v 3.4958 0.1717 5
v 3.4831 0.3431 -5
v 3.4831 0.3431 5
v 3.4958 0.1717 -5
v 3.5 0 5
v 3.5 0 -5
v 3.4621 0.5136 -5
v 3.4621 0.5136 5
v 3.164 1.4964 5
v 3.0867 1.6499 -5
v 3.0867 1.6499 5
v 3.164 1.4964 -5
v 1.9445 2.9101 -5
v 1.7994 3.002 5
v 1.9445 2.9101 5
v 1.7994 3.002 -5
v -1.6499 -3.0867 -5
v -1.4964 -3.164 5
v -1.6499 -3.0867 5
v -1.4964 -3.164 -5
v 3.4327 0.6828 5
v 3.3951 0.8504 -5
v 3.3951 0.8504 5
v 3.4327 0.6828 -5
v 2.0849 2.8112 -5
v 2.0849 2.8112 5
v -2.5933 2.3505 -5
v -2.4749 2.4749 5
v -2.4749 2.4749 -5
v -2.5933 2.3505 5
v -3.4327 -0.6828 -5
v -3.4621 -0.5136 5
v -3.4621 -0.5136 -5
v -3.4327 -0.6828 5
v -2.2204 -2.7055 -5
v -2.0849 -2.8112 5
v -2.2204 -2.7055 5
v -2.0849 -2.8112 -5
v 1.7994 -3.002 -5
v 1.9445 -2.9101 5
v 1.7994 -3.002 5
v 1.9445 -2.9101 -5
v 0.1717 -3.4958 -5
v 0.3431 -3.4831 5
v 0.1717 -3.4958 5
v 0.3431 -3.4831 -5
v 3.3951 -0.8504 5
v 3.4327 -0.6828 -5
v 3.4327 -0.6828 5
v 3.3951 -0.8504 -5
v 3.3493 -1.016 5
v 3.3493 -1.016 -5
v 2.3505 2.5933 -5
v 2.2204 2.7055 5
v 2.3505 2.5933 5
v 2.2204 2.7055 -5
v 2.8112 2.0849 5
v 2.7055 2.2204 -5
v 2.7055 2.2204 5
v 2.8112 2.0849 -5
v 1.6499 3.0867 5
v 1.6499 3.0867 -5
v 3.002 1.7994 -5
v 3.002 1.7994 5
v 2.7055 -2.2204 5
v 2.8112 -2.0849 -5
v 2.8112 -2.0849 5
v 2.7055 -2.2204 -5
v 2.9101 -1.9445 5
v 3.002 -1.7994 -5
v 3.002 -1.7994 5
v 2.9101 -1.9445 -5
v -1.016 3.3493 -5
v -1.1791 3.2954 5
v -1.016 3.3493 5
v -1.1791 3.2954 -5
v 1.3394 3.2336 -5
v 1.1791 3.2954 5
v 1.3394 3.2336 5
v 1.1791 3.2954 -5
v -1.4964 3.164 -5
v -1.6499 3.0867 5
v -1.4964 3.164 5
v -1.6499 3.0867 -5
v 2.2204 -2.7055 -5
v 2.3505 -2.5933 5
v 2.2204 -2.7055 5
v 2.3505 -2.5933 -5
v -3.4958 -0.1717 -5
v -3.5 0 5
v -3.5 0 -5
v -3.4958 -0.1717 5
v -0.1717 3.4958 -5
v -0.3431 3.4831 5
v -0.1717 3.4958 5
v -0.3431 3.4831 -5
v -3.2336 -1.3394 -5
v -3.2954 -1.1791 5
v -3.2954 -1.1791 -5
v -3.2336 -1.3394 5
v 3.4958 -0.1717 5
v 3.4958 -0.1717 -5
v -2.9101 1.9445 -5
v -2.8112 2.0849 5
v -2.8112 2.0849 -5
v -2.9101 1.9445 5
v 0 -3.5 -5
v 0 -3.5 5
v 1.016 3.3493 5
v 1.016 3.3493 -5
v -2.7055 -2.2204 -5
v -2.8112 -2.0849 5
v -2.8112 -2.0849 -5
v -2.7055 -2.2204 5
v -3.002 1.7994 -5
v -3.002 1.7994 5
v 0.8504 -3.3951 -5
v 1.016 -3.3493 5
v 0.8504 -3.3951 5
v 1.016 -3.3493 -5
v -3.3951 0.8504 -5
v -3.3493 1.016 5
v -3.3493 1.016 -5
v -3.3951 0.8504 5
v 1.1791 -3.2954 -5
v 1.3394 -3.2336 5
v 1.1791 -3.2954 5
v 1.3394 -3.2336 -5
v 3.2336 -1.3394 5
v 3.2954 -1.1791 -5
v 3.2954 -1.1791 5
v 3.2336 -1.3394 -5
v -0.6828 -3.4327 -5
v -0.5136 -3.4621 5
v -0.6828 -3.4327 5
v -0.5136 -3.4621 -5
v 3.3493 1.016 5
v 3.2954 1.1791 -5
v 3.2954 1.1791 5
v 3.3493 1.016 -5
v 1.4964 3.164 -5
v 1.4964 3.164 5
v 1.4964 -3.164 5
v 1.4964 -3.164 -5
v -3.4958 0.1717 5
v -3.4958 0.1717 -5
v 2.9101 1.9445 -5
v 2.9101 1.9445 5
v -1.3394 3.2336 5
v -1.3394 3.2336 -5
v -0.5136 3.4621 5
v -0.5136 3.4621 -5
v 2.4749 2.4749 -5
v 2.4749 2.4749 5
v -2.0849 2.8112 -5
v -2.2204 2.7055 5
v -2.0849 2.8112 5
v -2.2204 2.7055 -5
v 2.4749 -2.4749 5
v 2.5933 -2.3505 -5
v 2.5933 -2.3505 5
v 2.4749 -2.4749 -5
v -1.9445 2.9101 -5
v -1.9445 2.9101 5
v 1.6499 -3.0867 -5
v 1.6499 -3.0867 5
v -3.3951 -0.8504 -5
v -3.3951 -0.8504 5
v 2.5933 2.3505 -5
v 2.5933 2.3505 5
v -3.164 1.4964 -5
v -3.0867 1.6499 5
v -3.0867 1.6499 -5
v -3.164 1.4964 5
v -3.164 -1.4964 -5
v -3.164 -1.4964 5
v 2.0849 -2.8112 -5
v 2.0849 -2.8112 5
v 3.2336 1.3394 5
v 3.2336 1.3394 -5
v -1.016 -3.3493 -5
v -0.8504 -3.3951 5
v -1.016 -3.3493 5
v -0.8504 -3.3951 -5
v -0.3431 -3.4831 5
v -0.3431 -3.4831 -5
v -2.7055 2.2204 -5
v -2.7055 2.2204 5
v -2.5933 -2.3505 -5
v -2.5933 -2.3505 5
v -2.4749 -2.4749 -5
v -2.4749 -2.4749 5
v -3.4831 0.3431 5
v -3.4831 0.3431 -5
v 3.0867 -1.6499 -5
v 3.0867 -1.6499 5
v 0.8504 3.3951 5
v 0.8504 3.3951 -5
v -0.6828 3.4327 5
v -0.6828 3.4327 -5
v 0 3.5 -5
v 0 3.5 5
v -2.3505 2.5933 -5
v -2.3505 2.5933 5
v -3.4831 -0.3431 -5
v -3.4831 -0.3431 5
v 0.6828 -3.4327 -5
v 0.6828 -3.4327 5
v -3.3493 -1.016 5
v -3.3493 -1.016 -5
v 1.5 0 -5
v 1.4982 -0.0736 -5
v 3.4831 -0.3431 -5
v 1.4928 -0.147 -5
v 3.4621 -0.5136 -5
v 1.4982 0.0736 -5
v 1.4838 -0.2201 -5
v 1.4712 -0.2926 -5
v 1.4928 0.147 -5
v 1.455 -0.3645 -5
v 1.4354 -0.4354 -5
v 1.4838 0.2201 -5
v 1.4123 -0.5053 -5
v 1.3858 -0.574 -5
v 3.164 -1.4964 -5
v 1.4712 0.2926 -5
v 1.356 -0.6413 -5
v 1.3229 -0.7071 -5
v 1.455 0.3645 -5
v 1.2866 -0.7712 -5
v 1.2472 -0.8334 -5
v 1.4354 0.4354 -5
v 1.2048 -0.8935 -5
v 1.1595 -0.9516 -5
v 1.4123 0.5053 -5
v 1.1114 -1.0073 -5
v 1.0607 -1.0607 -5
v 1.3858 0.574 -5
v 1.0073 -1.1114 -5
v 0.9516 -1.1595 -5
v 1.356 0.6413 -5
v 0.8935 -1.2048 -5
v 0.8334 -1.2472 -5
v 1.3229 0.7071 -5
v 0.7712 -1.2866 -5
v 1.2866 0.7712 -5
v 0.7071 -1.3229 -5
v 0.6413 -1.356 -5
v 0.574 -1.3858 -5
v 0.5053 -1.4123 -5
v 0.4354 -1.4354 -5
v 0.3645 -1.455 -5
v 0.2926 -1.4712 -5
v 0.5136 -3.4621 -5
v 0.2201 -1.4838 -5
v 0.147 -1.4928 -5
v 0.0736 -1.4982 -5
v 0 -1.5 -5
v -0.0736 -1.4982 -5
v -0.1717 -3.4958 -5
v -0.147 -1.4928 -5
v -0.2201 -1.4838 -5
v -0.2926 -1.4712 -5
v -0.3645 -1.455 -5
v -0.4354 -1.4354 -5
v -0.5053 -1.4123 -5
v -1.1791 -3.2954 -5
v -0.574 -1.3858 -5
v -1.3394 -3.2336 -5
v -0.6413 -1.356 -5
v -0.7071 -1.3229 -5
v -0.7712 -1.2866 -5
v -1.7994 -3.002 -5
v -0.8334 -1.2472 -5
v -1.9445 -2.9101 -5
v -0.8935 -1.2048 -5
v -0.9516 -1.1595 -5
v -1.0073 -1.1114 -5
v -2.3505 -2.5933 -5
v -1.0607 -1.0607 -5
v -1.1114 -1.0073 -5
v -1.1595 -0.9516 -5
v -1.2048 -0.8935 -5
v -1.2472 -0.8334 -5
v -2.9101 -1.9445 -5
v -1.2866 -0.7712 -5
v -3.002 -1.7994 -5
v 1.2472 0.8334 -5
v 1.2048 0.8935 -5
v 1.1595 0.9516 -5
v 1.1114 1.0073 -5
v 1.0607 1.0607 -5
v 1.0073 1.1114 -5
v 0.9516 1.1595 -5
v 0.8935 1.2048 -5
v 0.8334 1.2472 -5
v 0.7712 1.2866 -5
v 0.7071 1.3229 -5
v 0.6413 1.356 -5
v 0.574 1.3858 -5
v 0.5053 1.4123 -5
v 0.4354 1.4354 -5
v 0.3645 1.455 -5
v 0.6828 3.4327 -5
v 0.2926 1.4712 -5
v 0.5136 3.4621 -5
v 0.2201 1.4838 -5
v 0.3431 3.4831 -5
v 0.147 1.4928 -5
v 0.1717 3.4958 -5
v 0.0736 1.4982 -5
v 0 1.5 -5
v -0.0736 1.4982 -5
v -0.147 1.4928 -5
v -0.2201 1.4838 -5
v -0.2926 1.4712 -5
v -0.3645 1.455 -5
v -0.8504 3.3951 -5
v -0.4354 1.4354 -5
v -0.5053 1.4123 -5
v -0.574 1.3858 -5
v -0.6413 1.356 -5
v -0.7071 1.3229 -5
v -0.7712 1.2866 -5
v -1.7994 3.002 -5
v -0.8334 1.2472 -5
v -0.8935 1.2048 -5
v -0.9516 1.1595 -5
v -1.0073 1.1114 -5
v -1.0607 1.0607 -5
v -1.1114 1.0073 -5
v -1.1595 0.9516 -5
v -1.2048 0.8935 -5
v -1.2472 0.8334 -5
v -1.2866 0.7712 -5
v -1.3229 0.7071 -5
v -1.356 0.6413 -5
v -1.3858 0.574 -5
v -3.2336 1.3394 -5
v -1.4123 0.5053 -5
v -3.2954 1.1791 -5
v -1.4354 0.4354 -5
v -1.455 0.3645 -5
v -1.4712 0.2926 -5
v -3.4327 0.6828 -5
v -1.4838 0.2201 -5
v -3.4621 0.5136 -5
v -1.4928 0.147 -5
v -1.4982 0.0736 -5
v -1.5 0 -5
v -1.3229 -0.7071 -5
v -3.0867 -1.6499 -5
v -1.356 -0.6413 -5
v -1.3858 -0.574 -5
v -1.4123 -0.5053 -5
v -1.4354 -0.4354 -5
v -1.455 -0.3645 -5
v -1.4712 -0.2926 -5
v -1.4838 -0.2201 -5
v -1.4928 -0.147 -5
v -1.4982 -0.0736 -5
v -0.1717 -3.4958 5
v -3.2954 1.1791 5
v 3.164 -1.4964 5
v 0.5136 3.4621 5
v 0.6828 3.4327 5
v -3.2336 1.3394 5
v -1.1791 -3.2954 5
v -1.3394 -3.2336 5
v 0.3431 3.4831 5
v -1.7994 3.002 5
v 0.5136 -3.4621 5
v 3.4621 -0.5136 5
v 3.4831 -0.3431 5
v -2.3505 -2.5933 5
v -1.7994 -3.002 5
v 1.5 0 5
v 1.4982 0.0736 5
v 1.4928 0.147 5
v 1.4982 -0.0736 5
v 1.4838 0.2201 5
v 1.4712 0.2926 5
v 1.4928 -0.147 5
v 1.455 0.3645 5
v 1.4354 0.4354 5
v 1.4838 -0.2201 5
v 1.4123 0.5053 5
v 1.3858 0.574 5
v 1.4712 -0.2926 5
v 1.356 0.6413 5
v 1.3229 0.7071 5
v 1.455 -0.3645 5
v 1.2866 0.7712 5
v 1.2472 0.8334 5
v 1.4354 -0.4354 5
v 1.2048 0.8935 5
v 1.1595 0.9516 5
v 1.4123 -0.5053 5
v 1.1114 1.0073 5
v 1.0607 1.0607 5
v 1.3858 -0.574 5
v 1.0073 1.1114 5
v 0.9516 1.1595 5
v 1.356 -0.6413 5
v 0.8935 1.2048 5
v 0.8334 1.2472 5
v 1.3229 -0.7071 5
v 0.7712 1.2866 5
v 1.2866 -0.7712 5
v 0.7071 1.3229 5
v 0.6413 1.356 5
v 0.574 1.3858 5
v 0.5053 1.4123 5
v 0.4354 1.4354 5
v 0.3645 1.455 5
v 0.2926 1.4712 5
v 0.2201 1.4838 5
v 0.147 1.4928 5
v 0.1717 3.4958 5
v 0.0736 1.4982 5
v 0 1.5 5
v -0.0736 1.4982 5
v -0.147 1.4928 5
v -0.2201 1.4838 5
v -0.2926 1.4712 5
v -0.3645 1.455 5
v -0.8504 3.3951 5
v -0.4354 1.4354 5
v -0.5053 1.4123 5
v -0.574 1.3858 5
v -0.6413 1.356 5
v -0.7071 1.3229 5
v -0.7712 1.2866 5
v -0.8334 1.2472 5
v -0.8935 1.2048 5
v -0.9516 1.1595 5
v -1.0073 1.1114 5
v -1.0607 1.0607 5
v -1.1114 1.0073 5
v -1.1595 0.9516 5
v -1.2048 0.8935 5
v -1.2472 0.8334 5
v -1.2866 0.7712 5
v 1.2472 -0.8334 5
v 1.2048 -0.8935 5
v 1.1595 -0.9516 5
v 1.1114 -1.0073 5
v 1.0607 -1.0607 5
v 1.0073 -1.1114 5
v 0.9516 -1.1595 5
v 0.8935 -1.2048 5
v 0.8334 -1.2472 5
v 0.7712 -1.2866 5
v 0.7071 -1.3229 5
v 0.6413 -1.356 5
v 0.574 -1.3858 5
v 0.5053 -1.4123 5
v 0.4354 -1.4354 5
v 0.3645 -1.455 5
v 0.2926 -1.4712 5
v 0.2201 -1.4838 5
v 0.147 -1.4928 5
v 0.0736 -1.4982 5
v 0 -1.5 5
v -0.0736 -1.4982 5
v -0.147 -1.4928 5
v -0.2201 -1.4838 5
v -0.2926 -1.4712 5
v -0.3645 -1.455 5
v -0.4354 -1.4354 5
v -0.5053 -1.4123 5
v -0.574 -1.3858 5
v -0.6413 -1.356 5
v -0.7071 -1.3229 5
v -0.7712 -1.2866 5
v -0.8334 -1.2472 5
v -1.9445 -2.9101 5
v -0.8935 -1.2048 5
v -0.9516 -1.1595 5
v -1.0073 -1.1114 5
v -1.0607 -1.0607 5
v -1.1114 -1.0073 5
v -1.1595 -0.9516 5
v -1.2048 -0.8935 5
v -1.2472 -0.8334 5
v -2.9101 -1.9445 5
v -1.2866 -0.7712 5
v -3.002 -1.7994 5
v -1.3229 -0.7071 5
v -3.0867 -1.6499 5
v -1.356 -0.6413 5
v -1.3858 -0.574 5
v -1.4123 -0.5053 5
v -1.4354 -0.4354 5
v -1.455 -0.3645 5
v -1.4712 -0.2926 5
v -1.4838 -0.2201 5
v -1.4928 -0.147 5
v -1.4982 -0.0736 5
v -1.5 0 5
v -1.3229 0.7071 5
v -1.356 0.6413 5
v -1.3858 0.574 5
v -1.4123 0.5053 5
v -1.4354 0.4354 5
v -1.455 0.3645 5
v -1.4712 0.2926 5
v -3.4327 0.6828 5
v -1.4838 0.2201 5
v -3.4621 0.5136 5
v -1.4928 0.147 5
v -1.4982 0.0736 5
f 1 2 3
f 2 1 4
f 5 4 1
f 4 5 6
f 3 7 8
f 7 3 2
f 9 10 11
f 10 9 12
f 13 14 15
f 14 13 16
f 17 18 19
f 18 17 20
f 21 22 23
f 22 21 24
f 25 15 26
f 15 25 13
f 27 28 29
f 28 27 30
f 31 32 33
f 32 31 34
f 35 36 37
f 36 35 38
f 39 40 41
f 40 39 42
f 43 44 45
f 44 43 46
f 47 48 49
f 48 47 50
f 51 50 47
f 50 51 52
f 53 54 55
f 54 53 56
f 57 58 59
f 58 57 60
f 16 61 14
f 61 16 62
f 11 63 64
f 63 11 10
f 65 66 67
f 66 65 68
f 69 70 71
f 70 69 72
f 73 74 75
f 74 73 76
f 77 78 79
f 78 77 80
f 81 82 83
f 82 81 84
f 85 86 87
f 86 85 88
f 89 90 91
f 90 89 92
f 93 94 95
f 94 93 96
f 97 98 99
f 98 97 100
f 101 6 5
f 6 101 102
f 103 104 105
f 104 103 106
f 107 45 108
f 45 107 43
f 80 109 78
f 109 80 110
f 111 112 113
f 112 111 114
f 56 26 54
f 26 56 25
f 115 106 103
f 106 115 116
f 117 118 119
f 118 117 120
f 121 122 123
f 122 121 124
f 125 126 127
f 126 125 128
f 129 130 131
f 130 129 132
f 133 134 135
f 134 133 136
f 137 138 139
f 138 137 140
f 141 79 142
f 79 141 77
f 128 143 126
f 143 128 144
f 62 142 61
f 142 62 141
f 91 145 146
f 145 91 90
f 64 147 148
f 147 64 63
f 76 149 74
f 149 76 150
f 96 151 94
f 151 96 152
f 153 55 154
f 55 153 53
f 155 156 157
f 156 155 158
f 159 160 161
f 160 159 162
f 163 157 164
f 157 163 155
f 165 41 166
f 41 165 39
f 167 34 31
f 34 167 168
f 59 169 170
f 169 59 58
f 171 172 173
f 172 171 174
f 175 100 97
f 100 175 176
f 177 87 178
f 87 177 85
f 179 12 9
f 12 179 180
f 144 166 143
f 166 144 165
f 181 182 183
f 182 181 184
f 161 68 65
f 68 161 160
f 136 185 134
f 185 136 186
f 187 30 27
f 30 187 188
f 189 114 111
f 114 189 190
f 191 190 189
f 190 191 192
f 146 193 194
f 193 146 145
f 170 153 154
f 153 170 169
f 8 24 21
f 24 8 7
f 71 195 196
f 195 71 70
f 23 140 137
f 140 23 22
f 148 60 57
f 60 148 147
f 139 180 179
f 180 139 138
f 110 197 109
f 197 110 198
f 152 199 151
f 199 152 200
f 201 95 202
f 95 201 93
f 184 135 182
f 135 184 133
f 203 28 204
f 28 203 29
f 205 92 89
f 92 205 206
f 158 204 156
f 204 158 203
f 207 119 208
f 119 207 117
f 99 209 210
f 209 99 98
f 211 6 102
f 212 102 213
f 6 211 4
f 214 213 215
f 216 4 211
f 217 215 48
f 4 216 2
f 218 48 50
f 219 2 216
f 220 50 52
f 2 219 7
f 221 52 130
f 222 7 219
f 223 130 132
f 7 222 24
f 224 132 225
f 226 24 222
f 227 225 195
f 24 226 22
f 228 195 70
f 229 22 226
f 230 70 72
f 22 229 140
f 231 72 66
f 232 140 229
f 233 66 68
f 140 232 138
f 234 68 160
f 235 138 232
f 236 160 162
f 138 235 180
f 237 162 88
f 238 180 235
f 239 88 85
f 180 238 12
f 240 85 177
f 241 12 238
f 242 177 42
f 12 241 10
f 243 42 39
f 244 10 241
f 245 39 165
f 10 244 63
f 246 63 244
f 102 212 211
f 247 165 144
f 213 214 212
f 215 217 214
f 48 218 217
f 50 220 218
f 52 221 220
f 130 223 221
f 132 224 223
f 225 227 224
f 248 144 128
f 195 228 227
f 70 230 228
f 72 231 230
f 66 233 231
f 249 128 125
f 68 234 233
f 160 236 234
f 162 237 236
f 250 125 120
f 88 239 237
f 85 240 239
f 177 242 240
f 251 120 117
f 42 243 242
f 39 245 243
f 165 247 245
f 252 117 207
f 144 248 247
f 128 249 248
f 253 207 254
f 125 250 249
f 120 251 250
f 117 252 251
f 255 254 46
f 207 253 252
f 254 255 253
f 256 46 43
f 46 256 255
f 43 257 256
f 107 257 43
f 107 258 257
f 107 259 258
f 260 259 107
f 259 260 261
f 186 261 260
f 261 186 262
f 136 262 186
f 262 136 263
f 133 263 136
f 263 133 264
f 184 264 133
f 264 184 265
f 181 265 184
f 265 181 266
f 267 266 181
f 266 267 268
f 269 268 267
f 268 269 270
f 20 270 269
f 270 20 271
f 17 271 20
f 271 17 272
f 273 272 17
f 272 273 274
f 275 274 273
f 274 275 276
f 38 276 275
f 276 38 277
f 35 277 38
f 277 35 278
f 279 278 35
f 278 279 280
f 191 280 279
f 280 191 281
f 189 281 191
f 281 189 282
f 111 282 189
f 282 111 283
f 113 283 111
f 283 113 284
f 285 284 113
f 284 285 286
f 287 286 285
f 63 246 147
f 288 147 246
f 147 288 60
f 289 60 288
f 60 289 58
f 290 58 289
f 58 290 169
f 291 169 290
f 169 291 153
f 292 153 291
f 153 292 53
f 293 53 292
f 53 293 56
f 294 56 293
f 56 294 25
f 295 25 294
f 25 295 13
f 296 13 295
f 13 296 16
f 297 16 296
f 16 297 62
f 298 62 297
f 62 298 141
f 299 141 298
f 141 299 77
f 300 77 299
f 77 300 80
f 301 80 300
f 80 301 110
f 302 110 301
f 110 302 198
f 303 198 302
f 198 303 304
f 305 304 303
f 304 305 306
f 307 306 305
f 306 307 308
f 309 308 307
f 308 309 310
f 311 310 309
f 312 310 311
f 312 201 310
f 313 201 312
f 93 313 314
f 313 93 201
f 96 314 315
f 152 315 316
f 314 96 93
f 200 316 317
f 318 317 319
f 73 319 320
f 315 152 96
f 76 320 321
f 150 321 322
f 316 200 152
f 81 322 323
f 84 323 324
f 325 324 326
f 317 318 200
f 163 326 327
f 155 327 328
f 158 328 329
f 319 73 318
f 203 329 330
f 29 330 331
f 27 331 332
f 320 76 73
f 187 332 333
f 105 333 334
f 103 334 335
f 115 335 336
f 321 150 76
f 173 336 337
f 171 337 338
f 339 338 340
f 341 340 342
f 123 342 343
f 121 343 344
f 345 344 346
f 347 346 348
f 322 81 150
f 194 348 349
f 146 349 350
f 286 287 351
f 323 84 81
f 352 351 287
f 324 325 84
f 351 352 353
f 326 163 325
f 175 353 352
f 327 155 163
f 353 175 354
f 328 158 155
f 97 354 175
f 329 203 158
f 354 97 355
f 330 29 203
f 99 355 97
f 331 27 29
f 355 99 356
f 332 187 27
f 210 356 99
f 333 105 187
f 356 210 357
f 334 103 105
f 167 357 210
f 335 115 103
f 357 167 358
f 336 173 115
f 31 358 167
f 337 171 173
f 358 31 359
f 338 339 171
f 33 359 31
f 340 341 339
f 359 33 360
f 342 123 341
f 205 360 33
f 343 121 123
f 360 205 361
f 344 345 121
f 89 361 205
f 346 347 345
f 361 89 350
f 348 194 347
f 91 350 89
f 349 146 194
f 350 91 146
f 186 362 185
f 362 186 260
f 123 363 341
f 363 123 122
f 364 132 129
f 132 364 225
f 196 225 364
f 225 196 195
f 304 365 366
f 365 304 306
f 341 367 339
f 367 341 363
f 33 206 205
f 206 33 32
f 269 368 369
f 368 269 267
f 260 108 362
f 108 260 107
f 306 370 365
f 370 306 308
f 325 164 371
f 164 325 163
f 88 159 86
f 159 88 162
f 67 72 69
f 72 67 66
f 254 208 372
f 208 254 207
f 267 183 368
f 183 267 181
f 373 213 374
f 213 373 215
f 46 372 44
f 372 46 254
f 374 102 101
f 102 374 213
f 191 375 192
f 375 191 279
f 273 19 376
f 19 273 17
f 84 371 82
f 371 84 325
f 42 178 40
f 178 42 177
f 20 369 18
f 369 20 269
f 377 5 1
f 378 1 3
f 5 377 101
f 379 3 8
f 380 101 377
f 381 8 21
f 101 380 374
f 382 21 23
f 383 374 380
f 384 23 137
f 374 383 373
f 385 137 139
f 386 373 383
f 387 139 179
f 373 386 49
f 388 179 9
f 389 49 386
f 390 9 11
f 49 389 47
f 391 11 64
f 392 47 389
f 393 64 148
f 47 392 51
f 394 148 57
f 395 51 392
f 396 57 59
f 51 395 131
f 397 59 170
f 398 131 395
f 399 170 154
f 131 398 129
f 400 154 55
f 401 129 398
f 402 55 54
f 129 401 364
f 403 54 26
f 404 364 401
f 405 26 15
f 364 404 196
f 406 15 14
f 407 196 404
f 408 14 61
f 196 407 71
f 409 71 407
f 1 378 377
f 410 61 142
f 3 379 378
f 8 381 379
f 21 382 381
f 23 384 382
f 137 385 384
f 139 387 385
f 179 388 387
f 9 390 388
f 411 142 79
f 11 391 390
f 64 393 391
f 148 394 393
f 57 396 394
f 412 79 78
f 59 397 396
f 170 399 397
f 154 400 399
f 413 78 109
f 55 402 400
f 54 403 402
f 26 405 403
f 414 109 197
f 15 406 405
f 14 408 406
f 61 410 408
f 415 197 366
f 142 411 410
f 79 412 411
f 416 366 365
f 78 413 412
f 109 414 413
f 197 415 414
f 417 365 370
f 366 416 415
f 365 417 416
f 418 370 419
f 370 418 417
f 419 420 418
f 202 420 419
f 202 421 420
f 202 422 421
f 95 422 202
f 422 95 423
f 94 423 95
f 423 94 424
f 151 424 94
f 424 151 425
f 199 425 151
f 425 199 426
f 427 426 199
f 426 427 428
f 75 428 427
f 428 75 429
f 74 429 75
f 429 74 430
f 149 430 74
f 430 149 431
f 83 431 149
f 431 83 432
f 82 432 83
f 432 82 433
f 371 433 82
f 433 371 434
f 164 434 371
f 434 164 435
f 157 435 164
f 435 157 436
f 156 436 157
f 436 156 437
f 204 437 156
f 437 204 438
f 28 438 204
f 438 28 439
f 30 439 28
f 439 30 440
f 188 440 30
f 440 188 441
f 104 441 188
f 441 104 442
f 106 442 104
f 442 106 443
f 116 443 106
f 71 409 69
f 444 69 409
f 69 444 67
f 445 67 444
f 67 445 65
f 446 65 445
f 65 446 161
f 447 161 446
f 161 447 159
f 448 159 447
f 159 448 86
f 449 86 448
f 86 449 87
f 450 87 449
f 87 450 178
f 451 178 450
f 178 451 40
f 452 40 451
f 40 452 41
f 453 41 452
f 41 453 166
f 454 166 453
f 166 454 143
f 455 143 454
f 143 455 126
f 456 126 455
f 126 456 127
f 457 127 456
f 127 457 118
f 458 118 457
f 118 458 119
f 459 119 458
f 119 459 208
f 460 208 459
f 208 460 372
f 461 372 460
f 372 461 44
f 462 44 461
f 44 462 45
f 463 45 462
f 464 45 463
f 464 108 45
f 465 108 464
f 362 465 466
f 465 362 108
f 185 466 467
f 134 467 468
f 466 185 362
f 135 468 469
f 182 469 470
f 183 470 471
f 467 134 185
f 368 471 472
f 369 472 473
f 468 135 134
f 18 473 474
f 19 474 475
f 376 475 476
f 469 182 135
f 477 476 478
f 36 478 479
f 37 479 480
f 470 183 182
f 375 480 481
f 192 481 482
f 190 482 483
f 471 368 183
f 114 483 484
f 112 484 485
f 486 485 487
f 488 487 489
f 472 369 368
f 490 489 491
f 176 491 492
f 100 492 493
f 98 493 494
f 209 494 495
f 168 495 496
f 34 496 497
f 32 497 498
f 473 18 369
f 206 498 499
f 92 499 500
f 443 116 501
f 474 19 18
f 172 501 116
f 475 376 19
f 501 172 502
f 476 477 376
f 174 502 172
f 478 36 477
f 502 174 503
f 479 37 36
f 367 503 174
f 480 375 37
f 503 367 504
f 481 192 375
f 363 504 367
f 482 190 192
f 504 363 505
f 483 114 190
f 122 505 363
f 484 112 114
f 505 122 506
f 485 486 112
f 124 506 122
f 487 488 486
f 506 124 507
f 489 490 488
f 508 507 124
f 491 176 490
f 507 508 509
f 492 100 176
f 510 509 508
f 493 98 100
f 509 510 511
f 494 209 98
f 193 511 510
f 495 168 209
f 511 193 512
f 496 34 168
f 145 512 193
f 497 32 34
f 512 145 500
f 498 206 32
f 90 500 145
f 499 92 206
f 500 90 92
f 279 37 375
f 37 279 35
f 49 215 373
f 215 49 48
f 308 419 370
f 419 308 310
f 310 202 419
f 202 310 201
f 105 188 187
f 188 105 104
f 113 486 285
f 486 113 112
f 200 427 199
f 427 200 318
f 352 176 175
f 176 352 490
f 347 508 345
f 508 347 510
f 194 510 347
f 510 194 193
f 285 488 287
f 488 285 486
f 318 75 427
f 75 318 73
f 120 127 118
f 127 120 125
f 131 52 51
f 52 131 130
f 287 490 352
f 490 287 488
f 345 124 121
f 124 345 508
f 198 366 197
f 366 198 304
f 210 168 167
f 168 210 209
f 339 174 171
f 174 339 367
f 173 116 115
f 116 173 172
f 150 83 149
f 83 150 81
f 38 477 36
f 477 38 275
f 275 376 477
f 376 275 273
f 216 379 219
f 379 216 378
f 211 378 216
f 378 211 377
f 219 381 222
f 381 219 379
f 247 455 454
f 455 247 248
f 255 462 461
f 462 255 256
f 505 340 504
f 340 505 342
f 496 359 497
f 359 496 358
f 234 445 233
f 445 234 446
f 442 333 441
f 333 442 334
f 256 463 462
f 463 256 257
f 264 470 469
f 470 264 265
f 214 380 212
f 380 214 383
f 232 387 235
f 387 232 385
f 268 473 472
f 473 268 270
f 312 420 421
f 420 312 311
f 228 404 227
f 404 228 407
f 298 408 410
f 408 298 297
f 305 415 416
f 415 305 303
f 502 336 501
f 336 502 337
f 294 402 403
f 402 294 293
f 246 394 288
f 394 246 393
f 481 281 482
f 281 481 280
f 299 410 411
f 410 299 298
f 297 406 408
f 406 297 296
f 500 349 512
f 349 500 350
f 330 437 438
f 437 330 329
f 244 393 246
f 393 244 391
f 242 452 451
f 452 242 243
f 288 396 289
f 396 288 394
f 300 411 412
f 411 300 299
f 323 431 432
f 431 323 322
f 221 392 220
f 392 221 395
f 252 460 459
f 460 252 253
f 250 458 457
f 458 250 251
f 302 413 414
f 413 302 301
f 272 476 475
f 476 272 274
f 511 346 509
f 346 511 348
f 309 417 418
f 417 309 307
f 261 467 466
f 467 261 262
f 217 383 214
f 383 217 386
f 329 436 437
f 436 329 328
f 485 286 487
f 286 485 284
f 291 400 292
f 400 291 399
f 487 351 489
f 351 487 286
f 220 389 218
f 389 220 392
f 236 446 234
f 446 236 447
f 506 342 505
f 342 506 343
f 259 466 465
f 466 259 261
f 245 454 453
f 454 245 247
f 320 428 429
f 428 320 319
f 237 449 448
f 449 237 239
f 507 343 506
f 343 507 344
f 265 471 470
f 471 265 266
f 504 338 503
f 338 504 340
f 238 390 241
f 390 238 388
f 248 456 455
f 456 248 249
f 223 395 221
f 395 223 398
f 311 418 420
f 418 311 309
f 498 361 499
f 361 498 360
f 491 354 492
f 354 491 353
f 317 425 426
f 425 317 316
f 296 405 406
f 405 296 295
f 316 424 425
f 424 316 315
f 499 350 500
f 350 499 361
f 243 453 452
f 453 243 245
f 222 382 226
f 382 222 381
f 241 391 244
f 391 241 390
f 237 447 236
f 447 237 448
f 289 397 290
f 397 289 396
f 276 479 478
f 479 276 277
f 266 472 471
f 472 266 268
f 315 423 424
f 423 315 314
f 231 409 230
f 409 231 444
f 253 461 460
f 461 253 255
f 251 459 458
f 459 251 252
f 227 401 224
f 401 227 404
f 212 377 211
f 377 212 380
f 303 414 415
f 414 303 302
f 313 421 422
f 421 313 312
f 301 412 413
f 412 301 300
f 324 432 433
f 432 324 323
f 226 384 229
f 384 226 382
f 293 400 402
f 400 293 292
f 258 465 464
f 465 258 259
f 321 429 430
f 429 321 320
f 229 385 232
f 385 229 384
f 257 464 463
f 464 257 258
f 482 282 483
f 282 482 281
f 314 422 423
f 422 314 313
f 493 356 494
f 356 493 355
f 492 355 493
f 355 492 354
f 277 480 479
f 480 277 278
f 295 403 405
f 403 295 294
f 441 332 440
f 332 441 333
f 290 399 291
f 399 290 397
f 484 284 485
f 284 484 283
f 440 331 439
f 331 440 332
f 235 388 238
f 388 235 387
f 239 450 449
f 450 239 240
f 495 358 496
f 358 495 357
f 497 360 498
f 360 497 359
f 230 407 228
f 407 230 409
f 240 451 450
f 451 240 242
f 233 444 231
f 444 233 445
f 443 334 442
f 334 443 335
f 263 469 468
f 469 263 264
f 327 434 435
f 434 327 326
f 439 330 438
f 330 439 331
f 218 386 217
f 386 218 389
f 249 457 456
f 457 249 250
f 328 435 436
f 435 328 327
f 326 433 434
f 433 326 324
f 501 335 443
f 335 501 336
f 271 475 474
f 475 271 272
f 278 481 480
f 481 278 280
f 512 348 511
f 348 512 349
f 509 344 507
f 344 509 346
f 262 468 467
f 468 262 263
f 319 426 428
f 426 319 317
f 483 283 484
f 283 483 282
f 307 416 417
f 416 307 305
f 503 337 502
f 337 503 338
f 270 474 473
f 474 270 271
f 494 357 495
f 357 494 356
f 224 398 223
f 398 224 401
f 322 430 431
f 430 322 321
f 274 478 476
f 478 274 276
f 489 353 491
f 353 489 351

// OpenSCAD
// Linear bearing: 3.0mm bore, 7.0mm OD, 10.0mm length
// One connected solid (simple cylindrical sleeve with circular bore)

// Parameters
bore_diameter_mm  = 3.0;  //[1.5:6:0.1]
outer_diameter_mm = 7.0;  //[3.5:14:0.1]
length_mm         = 10.0; //[5:20:0.1]
overlap_mm        = 0.2;  //[0.05:1:0.05]

// Derived
bore_r  = bore_diameter_mm / 2;
outer_r = outer_diameter_mm / 2;

$fn = 128;

module linear_bearing() {
  difference() {
    cylinder(r=outer_r, h=length_mm, center=true);
    cylinder(r=bore_r,  h=length_mm + 2*overlap_mm, center=true);
  }
}

linear_bearing();
